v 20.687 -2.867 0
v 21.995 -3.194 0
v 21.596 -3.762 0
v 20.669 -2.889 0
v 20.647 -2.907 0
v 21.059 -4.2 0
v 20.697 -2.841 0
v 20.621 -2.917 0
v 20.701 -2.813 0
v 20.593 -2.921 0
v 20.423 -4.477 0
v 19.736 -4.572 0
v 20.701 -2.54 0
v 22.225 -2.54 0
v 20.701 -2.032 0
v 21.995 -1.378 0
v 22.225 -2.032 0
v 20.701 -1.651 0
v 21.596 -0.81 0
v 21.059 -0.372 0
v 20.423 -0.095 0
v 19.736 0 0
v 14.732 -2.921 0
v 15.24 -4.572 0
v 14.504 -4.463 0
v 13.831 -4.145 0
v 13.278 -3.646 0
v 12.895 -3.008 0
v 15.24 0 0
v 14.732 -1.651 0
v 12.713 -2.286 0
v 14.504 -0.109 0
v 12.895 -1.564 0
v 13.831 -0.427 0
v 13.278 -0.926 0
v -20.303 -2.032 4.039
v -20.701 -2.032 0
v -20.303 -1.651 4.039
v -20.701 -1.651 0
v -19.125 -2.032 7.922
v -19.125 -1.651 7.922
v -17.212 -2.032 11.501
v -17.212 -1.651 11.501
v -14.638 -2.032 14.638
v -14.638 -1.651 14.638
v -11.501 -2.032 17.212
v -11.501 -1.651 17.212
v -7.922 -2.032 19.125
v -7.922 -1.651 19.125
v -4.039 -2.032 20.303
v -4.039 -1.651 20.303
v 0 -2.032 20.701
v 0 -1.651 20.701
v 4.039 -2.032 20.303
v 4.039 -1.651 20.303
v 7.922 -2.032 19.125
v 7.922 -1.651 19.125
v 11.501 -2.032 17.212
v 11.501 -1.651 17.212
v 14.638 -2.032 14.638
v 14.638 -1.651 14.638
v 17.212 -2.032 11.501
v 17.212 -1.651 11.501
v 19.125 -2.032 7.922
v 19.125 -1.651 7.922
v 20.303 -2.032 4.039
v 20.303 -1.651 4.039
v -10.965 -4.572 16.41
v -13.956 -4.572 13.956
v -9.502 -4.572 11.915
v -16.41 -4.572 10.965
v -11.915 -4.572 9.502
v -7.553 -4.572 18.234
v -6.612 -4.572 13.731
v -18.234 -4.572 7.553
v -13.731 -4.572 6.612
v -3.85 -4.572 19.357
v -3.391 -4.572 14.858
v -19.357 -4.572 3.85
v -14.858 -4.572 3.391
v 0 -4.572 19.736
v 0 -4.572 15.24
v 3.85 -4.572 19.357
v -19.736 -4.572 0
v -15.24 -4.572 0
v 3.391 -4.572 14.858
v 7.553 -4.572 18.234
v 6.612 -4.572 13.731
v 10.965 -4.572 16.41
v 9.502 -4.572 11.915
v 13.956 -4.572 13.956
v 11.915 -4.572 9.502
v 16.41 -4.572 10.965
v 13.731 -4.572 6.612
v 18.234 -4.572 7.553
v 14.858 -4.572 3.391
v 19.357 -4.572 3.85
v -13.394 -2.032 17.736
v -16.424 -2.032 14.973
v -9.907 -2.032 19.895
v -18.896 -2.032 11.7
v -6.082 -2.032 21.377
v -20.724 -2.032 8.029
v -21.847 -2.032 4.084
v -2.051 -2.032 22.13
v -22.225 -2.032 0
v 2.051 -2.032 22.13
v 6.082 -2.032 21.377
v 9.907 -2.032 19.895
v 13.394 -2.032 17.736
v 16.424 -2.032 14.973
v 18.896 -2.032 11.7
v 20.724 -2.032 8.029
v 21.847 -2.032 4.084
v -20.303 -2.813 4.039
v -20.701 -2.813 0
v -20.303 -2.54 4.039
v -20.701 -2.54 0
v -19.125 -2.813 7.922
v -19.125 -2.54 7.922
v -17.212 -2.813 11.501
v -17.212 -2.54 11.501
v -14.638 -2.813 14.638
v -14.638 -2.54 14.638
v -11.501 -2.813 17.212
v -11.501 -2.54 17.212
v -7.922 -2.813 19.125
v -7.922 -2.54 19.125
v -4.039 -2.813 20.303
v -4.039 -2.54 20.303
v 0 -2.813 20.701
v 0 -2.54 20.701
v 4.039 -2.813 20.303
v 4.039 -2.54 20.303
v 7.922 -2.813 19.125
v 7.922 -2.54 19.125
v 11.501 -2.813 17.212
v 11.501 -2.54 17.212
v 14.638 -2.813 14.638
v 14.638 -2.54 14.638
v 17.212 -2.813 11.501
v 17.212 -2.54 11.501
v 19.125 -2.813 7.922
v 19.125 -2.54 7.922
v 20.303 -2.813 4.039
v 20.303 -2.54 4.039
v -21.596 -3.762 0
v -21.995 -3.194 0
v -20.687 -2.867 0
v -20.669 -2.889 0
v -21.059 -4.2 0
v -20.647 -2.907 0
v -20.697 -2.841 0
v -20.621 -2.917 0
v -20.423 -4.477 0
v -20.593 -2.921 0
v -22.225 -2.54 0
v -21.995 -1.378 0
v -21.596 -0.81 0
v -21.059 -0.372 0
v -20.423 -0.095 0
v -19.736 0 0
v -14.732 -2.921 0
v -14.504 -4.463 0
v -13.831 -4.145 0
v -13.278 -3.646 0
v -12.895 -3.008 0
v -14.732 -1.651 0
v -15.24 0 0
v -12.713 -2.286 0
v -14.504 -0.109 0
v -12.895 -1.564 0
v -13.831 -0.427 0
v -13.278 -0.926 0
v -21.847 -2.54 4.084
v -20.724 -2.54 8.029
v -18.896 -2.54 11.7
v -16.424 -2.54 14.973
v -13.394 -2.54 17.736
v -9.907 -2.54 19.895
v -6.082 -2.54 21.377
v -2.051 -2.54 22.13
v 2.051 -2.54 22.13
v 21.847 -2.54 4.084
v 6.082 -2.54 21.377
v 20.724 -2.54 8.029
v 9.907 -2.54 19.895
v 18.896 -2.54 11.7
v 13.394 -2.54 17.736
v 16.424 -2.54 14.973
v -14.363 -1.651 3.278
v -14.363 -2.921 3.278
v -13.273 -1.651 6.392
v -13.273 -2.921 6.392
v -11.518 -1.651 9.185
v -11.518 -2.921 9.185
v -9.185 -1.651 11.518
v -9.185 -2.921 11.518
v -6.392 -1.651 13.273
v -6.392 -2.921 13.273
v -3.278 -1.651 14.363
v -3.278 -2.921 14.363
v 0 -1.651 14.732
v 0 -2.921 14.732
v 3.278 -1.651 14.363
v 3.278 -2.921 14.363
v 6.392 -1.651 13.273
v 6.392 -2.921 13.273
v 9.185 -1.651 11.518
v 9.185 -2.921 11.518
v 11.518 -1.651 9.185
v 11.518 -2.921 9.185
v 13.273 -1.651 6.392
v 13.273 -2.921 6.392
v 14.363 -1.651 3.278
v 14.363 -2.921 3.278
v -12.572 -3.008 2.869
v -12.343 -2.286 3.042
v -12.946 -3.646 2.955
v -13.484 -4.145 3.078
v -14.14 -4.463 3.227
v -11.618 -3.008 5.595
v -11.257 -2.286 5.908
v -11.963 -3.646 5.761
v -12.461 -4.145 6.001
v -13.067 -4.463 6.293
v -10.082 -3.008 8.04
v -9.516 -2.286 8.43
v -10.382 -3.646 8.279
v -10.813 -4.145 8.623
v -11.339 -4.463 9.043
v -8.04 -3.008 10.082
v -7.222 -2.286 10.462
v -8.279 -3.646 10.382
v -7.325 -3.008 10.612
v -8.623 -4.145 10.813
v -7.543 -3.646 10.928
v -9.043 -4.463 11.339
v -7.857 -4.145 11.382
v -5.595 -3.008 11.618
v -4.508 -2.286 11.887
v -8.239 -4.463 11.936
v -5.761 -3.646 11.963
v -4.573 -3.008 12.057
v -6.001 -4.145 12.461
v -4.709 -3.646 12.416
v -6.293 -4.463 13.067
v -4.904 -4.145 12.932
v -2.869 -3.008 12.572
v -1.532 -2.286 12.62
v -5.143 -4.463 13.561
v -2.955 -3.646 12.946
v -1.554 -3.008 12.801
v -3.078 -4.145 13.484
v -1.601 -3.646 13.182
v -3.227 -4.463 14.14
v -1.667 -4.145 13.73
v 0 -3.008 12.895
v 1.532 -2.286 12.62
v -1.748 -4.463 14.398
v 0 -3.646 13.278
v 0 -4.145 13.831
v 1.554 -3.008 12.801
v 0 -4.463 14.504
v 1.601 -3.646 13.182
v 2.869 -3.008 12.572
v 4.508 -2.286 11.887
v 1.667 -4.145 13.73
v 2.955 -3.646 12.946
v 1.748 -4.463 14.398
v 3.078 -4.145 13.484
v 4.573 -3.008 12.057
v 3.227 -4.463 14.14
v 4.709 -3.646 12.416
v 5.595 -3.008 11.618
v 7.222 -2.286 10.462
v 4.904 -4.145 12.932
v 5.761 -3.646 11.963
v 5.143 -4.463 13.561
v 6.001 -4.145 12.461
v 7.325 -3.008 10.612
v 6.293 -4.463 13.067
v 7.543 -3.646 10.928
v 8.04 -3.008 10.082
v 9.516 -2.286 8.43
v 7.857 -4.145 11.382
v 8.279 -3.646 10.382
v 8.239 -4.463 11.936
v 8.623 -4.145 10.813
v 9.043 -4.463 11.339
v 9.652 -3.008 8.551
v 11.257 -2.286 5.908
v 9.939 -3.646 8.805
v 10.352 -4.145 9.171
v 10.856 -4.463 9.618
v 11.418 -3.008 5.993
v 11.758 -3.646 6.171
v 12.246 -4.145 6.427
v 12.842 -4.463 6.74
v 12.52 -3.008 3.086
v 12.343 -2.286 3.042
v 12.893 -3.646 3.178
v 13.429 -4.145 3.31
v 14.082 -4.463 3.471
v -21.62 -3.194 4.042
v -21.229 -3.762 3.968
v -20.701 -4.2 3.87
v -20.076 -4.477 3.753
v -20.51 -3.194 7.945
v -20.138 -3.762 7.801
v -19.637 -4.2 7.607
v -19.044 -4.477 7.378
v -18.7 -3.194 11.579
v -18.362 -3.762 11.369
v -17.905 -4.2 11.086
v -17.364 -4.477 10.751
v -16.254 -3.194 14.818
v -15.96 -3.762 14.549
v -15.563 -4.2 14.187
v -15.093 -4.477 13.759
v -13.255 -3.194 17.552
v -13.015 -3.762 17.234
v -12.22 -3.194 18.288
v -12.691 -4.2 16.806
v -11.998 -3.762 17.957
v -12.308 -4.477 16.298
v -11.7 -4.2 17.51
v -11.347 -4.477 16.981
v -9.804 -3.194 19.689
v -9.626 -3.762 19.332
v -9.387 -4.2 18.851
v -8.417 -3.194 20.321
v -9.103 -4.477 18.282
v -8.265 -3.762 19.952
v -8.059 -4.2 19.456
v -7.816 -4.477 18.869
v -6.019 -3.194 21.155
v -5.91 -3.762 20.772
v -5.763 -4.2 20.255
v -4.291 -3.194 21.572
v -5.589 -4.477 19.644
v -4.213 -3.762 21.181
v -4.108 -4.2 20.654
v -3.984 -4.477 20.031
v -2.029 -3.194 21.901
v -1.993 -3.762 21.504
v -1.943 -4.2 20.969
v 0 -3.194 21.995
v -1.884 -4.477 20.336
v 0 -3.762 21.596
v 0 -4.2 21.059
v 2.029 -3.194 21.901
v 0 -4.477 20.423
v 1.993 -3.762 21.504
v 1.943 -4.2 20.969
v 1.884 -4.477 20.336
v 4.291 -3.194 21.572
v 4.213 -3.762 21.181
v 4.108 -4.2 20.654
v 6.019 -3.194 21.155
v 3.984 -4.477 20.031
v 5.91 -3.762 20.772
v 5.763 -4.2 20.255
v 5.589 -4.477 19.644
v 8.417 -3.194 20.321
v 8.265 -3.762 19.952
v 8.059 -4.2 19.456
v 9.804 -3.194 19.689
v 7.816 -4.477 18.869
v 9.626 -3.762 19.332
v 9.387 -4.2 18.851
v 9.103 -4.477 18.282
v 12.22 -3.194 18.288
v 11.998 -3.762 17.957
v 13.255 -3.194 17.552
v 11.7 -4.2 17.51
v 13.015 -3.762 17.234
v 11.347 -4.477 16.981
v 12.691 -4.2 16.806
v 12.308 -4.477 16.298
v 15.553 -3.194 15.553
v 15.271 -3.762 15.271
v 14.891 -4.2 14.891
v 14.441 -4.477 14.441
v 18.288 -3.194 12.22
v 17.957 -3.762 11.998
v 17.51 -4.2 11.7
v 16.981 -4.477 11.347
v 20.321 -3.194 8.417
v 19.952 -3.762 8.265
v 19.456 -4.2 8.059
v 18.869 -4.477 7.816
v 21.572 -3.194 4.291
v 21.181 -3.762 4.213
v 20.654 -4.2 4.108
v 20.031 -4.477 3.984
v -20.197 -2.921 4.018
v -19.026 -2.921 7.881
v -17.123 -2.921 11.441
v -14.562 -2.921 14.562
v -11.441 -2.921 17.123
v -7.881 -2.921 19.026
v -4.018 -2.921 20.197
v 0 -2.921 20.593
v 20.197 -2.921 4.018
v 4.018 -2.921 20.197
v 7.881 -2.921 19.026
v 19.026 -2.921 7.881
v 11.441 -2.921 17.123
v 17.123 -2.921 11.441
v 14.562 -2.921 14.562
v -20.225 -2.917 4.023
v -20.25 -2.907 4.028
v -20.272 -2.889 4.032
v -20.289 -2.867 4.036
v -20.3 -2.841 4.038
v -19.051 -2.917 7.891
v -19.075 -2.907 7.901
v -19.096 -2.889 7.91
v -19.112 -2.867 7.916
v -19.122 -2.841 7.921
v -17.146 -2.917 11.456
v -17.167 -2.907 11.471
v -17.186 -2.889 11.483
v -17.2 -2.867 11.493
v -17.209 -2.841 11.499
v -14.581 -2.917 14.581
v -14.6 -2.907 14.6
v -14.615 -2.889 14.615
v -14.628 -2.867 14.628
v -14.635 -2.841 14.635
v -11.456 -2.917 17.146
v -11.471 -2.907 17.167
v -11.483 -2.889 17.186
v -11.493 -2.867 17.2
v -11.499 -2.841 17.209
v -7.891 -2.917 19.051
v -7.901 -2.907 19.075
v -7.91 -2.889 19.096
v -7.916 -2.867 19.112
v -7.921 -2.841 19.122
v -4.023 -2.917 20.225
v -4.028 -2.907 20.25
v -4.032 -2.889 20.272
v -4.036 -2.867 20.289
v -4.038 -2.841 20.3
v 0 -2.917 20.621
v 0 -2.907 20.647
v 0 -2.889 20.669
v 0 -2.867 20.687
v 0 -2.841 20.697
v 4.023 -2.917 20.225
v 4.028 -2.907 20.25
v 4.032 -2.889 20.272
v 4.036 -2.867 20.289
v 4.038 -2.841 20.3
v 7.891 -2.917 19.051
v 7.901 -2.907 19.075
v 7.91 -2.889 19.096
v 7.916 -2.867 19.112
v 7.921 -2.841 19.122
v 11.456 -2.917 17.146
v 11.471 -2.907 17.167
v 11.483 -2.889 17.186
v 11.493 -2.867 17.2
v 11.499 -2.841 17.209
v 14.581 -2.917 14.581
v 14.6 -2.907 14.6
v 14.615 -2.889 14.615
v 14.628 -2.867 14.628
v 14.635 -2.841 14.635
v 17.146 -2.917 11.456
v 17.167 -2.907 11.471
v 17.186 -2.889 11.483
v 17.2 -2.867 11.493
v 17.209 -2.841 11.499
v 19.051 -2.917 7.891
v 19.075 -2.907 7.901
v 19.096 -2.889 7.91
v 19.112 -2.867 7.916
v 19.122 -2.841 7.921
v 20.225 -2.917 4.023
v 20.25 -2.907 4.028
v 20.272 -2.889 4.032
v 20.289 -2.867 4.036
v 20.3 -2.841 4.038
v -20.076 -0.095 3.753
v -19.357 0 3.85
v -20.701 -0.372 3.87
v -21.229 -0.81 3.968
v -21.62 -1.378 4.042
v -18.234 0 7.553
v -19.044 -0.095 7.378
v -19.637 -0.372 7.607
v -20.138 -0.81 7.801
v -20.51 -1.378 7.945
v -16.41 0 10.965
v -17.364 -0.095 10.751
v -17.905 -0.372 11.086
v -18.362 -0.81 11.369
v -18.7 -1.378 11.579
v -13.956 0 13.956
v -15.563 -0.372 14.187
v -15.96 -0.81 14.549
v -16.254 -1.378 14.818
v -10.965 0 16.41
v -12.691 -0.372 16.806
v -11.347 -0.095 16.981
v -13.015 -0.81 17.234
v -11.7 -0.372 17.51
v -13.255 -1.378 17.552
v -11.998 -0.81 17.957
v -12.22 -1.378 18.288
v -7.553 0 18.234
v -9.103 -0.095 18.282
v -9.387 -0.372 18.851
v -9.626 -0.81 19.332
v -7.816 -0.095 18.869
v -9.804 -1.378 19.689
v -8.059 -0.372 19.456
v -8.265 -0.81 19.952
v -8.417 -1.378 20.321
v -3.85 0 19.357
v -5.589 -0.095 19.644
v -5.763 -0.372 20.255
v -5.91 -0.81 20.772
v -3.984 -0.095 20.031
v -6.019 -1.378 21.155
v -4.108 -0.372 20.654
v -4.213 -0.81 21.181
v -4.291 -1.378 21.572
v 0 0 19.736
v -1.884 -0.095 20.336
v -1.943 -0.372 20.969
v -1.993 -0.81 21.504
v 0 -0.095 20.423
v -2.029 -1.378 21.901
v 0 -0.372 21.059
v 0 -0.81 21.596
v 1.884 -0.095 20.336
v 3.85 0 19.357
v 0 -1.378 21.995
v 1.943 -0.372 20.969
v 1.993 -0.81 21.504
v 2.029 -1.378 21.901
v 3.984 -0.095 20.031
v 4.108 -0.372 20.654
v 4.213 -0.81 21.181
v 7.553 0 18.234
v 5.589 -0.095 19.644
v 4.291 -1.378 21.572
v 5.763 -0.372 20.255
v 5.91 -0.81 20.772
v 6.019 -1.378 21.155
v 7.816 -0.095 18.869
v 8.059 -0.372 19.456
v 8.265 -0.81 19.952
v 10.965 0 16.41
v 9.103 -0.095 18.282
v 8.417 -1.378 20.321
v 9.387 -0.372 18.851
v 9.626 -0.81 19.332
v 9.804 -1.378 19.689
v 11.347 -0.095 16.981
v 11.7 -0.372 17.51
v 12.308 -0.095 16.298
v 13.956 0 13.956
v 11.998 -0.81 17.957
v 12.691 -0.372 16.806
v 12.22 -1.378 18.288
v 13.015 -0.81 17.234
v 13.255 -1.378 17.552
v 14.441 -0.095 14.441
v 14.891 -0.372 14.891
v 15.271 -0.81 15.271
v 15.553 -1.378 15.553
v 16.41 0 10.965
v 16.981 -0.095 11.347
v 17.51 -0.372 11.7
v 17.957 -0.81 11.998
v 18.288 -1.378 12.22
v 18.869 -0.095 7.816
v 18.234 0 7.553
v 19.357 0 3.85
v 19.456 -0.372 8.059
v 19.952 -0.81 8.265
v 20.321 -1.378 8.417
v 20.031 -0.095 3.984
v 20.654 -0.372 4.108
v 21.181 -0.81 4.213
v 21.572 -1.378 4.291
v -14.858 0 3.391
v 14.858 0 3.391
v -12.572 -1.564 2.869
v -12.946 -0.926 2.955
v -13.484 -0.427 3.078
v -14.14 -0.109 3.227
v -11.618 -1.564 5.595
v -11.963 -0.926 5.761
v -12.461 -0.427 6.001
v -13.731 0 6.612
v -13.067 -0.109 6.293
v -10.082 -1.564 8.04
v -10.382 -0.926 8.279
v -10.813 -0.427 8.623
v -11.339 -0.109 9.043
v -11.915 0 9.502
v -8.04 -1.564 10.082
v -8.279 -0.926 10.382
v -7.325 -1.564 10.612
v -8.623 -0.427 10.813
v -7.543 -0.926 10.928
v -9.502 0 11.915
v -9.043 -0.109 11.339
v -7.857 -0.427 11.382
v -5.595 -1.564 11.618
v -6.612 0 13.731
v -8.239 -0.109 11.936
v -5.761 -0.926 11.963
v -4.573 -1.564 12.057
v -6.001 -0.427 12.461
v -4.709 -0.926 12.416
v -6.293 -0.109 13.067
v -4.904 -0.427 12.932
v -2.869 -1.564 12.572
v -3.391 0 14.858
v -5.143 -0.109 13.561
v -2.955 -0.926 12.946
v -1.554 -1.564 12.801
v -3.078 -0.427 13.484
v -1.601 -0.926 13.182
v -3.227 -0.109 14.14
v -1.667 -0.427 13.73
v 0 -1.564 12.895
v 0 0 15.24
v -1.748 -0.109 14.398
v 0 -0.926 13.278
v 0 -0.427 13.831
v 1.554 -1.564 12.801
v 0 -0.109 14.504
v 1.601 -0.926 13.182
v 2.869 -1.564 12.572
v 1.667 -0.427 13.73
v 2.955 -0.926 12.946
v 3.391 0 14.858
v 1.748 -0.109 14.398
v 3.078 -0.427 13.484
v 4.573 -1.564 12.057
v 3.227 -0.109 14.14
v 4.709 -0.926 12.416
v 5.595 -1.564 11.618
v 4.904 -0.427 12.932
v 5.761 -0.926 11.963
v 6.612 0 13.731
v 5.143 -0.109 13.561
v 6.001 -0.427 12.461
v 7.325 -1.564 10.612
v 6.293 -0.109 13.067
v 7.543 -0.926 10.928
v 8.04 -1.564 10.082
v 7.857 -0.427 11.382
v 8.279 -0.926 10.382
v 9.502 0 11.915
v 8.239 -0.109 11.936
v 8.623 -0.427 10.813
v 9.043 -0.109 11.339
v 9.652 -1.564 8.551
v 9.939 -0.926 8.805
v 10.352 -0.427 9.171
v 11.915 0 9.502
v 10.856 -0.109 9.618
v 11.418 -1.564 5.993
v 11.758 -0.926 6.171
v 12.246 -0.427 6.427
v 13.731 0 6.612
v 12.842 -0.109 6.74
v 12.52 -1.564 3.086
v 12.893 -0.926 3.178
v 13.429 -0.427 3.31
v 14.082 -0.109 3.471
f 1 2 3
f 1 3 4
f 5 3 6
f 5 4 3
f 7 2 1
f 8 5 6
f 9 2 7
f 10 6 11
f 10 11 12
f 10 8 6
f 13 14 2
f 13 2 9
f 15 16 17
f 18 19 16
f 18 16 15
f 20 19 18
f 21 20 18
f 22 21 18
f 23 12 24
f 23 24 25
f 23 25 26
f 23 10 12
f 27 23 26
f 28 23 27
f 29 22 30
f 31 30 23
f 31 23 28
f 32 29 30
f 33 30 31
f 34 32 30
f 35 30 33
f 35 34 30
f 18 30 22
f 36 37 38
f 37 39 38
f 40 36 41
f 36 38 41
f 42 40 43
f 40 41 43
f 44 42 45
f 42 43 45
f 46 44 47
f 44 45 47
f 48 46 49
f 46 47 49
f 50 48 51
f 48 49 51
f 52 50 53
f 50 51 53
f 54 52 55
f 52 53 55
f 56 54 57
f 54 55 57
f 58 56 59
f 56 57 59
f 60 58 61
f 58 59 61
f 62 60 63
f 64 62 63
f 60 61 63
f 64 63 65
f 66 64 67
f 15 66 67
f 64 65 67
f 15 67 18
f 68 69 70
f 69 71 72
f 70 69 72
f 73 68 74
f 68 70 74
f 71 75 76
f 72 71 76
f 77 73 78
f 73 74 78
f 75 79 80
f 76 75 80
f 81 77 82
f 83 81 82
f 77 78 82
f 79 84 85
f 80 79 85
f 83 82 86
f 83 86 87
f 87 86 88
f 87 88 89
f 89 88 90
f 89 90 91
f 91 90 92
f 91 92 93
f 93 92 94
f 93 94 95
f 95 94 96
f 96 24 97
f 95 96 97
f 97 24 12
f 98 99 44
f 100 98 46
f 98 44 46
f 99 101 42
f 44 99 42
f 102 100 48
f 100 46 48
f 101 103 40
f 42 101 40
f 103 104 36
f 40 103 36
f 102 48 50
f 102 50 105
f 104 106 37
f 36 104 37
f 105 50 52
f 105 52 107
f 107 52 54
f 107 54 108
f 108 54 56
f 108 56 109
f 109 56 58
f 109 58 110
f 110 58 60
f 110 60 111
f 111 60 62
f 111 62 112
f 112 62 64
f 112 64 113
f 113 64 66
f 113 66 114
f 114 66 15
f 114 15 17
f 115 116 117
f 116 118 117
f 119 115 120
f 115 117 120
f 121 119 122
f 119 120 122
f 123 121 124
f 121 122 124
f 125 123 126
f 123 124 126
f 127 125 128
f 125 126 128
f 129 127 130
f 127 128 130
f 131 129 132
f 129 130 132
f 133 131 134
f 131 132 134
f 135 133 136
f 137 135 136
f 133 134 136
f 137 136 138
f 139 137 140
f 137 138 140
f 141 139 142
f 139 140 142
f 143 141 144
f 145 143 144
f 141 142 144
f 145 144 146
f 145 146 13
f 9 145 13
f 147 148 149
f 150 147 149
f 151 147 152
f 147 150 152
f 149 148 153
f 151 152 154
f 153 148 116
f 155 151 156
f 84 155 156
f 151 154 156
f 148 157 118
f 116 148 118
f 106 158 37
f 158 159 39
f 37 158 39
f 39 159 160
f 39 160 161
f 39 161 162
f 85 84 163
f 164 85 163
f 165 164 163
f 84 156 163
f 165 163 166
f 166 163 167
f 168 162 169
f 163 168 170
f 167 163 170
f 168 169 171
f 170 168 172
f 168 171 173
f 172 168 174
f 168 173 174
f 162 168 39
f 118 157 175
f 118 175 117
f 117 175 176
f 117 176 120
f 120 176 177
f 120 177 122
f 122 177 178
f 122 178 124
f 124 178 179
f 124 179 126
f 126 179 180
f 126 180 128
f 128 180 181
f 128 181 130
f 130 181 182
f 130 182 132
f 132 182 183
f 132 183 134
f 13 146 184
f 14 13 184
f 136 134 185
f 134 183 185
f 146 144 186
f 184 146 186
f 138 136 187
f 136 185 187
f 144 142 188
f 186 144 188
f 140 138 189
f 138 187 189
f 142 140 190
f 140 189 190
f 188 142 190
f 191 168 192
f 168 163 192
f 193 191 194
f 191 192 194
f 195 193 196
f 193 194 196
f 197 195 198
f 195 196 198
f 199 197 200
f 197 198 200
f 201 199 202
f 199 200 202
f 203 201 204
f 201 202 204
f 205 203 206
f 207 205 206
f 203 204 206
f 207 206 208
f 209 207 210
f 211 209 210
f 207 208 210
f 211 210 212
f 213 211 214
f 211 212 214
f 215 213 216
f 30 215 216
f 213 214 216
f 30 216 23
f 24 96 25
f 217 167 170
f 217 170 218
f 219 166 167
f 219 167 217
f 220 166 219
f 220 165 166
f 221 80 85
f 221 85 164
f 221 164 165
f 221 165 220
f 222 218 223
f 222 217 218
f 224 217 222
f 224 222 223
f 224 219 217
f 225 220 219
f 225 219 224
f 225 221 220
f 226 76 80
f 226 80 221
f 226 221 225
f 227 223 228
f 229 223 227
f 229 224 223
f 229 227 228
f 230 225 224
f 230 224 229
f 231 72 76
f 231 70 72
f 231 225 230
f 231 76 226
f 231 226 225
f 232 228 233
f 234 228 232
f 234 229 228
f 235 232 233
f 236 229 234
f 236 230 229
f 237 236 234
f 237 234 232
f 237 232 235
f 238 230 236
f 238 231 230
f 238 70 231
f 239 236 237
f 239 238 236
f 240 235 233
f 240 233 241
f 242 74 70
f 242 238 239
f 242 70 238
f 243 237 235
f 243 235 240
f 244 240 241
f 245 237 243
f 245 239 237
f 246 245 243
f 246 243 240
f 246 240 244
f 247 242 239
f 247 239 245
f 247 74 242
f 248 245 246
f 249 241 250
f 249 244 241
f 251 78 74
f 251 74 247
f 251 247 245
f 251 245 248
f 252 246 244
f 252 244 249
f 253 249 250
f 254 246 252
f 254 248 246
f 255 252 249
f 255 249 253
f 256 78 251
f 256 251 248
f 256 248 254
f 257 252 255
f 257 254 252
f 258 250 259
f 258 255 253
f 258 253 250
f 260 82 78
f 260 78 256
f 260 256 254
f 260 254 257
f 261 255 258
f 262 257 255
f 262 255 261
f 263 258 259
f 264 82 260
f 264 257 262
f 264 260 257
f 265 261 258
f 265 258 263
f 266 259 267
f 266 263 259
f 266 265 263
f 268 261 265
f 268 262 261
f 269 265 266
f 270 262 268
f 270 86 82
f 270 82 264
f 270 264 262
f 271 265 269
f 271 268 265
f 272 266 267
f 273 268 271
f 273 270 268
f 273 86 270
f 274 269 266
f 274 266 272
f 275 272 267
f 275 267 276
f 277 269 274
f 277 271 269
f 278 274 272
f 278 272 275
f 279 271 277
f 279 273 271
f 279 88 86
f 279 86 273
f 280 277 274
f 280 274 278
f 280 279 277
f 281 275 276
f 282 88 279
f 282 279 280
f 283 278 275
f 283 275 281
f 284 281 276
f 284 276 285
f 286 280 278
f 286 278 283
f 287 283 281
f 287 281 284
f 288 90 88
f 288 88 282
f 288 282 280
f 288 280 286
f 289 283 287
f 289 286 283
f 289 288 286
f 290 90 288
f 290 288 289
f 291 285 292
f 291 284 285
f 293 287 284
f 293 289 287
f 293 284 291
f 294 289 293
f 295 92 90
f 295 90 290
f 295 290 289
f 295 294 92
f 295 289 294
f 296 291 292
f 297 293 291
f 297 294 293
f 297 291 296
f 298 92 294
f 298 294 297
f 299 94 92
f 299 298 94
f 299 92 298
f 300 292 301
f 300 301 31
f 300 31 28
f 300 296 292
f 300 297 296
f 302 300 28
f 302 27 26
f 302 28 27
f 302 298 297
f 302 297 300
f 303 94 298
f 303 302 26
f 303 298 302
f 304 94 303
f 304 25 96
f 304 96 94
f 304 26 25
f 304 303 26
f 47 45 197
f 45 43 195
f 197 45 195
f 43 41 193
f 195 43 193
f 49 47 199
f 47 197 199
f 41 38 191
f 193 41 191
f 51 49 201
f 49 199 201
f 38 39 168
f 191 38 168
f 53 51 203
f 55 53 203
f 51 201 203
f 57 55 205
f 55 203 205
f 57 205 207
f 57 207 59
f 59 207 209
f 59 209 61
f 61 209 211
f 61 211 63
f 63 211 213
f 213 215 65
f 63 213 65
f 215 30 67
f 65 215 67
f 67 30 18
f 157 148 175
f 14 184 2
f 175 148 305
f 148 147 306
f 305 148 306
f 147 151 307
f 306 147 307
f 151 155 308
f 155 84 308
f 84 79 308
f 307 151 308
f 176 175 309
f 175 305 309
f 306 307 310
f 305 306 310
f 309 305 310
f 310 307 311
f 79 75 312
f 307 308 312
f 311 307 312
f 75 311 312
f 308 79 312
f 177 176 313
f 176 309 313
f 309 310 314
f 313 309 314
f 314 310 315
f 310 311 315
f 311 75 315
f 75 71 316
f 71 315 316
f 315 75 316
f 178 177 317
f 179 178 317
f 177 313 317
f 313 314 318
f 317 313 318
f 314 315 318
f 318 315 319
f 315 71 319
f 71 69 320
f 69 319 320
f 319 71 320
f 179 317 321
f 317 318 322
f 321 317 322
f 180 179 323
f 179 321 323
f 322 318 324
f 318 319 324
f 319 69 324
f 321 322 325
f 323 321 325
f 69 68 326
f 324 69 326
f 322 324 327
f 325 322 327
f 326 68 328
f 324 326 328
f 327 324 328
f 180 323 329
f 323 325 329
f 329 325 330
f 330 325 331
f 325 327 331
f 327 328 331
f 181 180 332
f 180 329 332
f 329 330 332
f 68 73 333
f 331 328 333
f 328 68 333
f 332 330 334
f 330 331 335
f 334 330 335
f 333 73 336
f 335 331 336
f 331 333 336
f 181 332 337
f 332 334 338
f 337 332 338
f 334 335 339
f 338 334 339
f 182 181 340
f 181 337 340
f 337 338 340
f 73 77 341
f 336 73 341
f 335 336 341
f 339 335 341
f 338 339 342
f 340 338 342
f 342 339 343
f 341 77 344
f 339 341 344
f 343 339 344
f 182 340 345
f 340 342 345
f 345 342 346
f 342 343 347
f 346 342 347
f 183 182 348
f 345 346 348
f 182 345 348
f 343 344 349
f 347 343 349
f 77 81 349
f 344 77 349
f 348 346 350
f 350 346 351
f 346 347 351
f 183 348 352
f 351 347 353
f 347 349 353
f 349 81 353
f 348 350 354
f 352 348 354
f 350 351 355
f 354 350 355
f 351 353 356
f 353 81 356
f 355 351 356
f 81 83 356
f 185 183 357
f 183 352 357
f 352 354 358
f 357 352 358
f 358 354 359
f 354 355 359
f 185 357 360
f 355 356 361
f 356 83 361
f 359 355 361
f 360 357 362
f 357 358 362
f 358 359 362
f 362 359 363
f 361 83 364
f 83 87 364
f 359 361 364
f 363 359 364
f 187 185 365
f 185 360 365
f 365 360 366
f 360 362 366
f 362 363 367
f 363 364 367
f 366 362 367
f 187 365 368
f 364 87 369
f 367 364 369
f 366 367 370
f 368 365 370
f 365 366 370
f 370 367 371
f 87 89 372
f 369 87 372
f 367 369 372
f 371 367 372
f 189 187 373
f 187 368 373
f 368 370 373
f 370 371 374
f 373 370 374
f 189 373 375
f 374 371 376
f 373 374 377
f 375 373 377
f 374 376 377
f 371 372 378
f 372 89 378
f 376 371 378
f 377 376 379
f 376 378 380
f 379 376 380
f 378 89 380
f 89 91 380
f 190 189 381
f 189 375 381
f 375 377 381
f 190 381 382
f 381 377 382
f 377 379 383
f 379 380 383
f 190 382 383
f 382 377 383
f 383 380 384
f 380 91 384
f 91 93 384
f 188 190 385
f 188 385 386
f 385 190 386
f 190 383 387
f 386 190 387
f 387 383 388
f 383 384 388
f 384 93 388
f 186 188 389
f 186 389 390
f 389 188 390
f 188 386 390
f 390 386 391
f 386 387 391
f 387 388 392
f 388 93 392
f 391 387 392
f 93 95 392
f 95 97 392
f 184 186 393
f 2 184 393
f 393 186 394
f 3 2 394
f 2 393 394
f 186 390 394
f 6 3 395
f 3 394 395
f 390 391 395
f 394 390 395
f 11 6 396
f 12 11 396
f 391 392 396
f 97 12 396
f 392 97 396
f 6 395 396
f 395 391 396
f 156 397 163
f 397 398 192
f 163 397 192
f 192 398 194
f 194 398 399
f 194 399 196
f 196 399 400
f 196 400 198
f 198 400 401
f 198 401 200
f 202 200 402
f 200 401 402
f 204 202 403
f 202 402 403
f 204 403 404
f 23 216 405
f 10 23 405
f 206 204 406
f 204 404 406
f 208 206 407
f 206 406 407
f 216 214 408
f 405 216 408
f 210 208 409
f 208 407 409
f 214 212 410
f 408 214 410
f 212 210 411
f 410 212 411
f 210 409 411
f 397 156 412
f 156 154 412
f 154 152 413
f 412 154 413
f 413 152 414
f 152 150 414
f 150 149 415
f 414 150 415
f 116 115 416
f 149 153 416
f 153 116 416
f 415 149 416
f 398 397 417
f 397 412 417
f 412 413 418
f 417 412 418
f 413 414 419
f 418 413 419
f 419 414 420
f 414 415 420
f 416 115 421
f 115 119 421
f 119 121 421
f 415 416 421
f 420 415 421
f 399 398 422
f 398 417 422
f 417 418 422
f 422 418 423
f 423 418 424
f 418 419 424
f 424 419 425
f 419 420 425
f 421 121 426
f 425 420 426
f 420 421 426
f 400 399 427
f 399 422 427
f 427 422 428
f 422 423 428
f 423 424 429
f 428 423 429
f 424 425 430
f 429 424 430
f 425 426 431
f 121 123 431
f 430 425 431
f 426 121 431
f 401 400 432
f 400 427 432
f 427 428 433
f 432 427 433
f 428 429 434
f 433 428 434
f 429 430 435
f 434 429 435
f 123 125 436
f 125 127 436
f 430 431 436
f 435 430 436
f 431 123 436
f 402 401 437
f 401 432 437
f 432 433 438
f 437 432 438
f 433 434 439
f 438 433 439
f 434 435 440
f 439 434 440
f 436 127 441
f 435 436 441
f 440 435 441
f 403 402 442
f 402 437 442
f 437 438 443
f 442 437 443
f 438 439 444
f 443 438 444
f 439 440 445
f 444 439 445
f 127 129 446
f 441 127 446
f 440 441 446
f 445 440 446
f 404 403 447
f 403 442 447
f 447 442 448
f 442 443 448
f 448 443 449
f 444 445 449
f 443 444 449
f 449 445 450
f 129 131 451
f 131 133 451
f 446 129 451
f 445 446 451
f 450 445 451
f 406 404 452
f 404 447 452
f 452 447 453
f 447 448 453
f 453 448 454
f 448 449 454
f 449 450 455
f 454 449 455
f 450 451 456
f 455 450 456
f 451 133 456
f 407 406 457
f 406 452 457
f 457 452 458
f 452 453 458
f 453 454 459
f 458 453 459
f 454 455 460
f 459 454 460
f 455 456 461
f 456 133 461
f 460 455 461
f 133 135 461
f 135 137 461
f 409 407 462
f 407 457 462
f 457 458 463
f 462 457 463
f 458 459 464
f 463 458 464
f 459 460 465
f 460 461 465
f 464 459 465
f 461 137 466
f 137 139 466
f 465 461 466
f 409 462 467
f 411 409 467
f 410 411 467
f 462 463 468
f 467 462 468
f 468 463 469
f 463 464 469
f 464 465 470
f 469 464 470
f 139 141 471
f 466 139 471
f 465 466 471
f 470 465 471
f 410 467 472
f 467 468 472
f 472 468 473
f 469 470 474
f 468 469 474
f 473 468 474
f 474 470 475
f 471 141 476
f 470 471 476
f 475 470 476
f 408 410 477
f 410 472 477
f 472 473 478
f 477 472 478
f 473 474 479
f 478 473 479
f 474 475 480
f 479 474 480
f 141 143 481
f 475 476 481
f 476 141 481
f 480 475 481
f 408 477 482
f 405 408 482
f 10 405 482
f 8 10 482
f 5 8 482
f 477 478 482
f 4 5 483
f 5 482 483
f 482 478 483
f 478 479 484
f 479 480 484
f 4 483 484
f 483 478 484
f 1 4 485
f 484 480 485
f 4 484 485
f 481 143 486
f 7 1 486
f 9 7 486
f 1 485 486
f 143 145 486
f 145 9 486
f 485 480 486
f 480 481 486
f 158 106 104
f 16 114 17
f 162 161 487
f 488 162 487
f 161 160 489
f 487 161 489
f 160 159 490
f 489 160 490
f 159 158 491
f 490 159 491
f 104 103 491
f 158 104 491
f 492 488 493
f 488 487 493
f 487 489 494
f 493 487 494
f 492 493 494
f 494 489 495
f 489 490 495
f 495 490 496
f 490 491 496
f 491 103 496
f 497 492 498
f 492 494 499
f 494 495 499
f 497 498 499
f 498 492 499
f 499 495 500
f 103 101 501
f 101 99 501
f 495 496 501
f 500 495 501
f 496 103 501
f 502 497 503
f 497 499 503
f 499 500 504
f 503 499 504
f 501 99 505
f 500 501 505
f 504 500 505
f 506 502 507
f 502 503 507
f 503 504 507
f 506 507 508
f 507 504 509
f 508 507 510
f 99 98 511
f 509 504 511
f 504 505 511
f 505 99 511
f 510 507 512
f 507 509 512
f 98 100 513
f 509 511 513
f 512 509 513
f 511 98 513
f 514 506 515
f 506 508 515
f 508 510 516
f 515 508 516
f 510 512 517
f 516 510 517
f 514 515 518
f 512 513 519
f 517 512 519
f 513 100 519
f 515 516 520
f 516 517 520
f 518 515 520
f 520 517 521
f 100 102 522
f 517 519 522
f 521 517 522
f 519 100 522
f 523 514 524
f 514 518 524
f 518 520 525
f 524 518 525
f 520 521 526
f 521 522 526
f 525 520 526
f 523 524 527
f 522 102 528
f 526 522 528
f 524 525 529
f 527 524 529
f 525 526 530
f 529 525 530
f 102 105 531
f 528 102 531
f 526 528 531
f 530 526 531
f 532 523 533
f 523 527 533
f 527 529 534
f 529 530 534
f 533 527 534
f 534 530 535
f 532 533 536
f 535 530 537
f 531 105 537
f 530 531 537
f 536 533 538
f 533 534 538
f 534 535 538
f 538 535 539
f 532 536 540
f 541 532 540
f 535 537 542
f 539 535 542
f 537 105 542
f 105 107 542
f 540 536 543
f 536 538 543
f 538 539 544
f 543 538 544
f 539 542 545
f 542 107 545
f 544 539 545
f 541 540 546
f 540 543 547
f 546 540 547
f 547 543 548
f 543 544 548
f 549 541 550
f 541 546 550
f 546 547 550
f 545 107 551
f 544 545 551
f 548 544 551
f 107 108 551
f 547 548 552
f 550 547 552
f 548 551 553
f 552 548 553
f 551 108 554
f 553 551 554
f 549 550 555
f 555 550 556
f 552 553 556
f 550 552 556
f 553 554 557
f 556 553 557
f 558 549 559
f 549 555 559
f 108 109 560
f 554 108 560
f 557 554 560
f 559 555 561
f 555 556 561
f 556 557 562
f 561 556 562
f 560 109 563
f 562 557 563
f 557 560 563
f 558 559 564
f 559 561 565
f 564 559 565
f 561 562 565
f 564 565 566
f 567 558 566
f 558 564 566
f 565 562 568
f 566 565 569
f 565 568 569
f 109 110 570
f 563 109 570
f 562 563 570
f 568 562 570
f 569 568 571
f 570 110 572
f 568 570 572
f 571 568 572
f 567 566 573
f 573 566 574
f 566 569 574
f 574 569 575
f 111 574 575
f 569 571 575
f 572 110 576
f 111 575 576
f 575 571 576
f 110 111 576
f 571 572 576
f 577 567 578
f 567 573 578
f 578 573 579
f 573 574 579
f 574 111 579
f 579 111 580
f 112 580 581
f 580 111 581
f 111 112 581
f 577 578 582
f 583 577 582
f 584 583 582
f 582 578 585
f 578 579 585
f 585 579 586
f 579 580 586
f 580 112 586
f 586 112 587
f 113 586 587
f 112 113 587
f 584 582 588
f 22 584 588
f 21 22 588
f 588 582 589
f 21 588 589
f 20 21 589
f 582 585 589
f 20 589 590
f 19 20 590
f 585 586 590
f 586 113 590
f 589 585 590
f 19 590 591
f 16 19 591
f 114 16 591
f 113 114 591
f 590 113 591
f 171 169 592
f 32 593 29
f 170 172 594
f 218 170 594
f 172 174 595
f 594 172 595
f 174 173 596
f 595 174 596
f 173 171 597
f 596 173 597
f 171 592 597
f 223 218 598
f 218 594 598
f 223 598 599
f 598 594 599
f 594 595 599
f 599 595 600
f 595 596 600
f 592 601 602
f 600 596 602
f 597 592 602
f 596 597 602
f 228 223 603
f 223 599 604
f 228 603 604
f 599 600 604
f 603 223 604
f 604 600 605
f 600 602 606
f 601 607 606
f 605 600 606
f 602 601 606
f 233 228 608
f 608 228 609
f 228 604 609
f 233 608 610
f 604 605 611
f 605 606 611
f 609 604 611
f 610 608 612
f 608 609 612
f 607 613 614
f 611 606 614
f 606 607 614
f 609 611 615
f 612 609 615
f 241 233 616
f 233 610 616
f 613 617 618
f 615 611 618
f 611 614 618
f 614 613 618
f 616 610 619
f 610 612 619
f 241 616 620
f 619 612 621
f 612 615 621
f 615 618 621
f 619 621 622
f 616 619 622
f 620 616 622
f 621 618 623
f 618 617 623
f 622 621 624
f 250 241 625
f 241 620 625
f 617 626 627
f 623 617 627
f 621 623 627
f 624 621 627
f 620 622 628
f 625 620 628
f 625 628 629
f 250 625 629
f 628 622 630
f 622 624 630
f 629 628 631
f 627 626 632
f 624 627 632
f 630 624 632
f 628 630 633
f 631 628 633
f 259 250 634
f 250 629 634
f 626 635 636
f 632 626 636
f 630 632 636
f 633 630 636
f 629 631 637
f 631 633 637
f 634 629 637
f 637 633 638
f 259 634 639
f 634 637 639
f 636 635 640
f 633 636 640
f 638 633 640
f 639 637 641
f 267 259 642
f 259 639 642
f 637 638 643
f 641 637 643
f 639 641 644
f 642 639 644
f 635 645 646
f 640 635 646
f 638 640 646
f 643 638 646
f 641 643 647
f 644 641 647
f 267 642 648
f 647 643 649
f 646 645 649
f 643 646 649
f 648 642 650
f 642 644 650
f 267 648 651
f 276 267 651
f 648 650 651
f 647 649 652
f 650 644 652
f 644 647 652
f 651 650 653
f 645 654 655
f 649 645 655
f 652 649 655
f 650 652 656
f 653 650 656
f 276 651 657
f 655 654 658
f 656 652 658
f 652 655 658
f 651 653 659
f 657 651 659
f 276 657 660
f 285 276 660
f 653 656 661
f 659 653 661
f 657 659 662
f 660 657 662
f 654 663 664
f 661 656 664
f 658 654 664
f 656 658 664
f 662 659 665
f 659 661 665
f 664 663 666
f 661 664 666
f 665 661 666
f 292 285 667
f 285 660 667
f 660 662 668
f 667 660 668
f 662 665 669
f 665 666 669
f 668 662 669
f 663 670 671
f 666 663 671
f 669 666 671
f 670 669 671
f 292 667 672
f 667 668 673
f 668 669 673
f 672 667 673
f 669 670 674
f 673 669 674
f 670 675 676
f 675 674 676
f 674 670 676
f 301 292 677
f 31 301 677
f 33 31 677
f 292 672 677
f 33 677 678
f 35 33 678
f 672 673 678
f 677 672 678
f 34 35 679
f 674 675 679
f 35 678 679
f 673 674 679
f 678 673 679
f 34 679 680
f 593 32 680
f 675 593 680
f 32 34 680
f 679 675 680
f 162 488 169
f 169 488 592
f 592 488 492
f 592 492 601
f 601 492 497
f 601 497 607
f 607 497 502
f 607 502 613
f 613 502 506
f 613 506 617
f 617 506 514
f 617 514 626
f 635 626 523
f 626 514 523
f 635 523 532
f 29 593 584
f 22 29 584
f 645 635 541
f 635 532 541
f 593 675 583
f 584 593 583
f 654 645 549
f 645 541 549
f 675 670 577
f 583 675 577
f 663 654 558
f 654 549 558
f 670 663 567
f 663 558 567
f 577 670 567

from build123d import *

# Parameters (mm, degrees)
F3_T2_ANGLE = 212.1305431318
F3_T4_ANGLE = 212.1305431318
F3_T6_ANGLE = 237.3879219603
F3_T8_ANGLE = 237.3879219603


# Not quite as in the source:
# - a fillet or chamfer that OpenCascade refuses, or shapes differently, is made with other operations: its cross-section is extruded or revolved along the edge and cut away or added


with BuildPart() as f2:
    # F2: sweep along a path in F0
    with BuildLine(Plane.XZ) as f2_path:
        ThreePointArc((-12.7, 0), (0, 12.7), (12.7, 0))
    # F1 (on Top) → F2 (sweep)
    with BuildSketch(Plane.XY):
        with BuildLine():
            Line((-12.7, -4.572), (-12.7, 0))
            Line((-12.7, 0), (-22.225, 0))
            Line((-22.225, 0), (-22.225, -2.032))
            Line((-22.225, -2.032), (-20.701, -2.032))
            Line((-20.701, -2.032), (-20.701, -1.651))
            Line((-20.701, -1.651), (-14.732, -1.651))
            Line((-14.732, -1.651), (-14.732, -2.921))
            Line((-14.732, -2.921), (-20.5930953096, -2.921))
            ThreePointArc((-20.5930953096, -2.921), (-20.6693954479, -2.8893954479), (-20.701, -2.8130953096))
            Line((-20.701, -2.8130953096), (-20.701, -2.54))
            Line((-20.701, -2.54), (-22.225, -2.54))
            Line((-22.225, -2.54), (-22.225, -4.572))
            Line((-22.225, -4.572), (-12.7, -4.572))
        make_face()
    sweep(path=f2_path.line)

    # F3: fillet of radius 2.54 on 4 edges, made by hand

    # F3_s1 → F3_t2 (revolve, cut)
    with BuildSketch(Plane(origin=(0, 0, 0), x_dir=(0, 1, 0), z_dir=(0.2767322496, 0, -0.9609470651))):
        with BuildLine():
            ThreePointArc((-2.54, -22.225), (-3.9994755399, -21.3427554727), (-4.572, -19.7363184213))
            Line((-4.572, -19.7363184213), (-4.572, -22.225))
            Line((-4.572, -22.225), (-2.54, -22.225))
        make_face()
    revolve(axis=Axis((0, -4.572, 0), (0, 1, 0)), revolution_arc=F3_T2_ANGLE, mode=Mode.SUBTRACT)

    # F3_s3 → F3_t4 (revolve, cut)
    with BuildSketch(Plane(origin=(0, 0, 0), x_dir=(0, 1, 0), z_dir=(0.2767322496, 0, -0.9609470651))):
        with BuildLine():
            ThreePointArc((0, -19.7363184213), (-0.5725244601, -21.3427554727), (-2.032, -22.225))
            Line((-2.032, -22.225), (0, -22.225))
            Line((0, -22.225), (0, -19.7363184213))
        make_face()
    revolve(axis=Axis((0, 0, 0), (0, 1, 0)), revolution_arc=F3_T4_ANGLE, mode=Mode.SUBTRACT)

    # F3_s5 → F3_t6 (revolve, cut)
    with BuildSketch(Plane(origin=(0, 0, 0), x_dir=(0, 1, 0), z_dir=(0.4801310429, 0, -0.8771967748))):
        with BuildLine():
            ThreePointArc((-2.032, -12.7), (-3.8280512242, -13.4439487758), (-4.572, -15.24))
            Line((-4.572, -15.24), (-4.572, -12.7))
            Line((-4.572, -12.7), (-2.032, -12.7))
        make_face()
    revolve(axis=Axis((0, -4.572, 0), (0, 1, 0)), revolution_arc=F3_T6_ANGLE, mode=Mode.SUBTRACT)

    # F3_s7 → F3_t8 (revolve, cut)
    with BuildSketch(Plane(origin=(0, 0, 0), x_dir=(0, 1, 0), z_dir=(0.4801310429, 0, -0.8771967748))):
        with BuildLine():
            ThreePointArc((-2.54, -12.7), (-0.7439487758, -13.4439487758), (0, -15.24))
            Line((0, -15.24), (0, -12.7))
            Line((0, -12.7), (-2.54, -12.7))
        make_face()
    revolve(axis=Axis((0, 0, 0), (0, 1, 0)), revolution_arc=F3_T8_ANGLE, mode=Mode.SUBTRACT)


solid = f2.part
